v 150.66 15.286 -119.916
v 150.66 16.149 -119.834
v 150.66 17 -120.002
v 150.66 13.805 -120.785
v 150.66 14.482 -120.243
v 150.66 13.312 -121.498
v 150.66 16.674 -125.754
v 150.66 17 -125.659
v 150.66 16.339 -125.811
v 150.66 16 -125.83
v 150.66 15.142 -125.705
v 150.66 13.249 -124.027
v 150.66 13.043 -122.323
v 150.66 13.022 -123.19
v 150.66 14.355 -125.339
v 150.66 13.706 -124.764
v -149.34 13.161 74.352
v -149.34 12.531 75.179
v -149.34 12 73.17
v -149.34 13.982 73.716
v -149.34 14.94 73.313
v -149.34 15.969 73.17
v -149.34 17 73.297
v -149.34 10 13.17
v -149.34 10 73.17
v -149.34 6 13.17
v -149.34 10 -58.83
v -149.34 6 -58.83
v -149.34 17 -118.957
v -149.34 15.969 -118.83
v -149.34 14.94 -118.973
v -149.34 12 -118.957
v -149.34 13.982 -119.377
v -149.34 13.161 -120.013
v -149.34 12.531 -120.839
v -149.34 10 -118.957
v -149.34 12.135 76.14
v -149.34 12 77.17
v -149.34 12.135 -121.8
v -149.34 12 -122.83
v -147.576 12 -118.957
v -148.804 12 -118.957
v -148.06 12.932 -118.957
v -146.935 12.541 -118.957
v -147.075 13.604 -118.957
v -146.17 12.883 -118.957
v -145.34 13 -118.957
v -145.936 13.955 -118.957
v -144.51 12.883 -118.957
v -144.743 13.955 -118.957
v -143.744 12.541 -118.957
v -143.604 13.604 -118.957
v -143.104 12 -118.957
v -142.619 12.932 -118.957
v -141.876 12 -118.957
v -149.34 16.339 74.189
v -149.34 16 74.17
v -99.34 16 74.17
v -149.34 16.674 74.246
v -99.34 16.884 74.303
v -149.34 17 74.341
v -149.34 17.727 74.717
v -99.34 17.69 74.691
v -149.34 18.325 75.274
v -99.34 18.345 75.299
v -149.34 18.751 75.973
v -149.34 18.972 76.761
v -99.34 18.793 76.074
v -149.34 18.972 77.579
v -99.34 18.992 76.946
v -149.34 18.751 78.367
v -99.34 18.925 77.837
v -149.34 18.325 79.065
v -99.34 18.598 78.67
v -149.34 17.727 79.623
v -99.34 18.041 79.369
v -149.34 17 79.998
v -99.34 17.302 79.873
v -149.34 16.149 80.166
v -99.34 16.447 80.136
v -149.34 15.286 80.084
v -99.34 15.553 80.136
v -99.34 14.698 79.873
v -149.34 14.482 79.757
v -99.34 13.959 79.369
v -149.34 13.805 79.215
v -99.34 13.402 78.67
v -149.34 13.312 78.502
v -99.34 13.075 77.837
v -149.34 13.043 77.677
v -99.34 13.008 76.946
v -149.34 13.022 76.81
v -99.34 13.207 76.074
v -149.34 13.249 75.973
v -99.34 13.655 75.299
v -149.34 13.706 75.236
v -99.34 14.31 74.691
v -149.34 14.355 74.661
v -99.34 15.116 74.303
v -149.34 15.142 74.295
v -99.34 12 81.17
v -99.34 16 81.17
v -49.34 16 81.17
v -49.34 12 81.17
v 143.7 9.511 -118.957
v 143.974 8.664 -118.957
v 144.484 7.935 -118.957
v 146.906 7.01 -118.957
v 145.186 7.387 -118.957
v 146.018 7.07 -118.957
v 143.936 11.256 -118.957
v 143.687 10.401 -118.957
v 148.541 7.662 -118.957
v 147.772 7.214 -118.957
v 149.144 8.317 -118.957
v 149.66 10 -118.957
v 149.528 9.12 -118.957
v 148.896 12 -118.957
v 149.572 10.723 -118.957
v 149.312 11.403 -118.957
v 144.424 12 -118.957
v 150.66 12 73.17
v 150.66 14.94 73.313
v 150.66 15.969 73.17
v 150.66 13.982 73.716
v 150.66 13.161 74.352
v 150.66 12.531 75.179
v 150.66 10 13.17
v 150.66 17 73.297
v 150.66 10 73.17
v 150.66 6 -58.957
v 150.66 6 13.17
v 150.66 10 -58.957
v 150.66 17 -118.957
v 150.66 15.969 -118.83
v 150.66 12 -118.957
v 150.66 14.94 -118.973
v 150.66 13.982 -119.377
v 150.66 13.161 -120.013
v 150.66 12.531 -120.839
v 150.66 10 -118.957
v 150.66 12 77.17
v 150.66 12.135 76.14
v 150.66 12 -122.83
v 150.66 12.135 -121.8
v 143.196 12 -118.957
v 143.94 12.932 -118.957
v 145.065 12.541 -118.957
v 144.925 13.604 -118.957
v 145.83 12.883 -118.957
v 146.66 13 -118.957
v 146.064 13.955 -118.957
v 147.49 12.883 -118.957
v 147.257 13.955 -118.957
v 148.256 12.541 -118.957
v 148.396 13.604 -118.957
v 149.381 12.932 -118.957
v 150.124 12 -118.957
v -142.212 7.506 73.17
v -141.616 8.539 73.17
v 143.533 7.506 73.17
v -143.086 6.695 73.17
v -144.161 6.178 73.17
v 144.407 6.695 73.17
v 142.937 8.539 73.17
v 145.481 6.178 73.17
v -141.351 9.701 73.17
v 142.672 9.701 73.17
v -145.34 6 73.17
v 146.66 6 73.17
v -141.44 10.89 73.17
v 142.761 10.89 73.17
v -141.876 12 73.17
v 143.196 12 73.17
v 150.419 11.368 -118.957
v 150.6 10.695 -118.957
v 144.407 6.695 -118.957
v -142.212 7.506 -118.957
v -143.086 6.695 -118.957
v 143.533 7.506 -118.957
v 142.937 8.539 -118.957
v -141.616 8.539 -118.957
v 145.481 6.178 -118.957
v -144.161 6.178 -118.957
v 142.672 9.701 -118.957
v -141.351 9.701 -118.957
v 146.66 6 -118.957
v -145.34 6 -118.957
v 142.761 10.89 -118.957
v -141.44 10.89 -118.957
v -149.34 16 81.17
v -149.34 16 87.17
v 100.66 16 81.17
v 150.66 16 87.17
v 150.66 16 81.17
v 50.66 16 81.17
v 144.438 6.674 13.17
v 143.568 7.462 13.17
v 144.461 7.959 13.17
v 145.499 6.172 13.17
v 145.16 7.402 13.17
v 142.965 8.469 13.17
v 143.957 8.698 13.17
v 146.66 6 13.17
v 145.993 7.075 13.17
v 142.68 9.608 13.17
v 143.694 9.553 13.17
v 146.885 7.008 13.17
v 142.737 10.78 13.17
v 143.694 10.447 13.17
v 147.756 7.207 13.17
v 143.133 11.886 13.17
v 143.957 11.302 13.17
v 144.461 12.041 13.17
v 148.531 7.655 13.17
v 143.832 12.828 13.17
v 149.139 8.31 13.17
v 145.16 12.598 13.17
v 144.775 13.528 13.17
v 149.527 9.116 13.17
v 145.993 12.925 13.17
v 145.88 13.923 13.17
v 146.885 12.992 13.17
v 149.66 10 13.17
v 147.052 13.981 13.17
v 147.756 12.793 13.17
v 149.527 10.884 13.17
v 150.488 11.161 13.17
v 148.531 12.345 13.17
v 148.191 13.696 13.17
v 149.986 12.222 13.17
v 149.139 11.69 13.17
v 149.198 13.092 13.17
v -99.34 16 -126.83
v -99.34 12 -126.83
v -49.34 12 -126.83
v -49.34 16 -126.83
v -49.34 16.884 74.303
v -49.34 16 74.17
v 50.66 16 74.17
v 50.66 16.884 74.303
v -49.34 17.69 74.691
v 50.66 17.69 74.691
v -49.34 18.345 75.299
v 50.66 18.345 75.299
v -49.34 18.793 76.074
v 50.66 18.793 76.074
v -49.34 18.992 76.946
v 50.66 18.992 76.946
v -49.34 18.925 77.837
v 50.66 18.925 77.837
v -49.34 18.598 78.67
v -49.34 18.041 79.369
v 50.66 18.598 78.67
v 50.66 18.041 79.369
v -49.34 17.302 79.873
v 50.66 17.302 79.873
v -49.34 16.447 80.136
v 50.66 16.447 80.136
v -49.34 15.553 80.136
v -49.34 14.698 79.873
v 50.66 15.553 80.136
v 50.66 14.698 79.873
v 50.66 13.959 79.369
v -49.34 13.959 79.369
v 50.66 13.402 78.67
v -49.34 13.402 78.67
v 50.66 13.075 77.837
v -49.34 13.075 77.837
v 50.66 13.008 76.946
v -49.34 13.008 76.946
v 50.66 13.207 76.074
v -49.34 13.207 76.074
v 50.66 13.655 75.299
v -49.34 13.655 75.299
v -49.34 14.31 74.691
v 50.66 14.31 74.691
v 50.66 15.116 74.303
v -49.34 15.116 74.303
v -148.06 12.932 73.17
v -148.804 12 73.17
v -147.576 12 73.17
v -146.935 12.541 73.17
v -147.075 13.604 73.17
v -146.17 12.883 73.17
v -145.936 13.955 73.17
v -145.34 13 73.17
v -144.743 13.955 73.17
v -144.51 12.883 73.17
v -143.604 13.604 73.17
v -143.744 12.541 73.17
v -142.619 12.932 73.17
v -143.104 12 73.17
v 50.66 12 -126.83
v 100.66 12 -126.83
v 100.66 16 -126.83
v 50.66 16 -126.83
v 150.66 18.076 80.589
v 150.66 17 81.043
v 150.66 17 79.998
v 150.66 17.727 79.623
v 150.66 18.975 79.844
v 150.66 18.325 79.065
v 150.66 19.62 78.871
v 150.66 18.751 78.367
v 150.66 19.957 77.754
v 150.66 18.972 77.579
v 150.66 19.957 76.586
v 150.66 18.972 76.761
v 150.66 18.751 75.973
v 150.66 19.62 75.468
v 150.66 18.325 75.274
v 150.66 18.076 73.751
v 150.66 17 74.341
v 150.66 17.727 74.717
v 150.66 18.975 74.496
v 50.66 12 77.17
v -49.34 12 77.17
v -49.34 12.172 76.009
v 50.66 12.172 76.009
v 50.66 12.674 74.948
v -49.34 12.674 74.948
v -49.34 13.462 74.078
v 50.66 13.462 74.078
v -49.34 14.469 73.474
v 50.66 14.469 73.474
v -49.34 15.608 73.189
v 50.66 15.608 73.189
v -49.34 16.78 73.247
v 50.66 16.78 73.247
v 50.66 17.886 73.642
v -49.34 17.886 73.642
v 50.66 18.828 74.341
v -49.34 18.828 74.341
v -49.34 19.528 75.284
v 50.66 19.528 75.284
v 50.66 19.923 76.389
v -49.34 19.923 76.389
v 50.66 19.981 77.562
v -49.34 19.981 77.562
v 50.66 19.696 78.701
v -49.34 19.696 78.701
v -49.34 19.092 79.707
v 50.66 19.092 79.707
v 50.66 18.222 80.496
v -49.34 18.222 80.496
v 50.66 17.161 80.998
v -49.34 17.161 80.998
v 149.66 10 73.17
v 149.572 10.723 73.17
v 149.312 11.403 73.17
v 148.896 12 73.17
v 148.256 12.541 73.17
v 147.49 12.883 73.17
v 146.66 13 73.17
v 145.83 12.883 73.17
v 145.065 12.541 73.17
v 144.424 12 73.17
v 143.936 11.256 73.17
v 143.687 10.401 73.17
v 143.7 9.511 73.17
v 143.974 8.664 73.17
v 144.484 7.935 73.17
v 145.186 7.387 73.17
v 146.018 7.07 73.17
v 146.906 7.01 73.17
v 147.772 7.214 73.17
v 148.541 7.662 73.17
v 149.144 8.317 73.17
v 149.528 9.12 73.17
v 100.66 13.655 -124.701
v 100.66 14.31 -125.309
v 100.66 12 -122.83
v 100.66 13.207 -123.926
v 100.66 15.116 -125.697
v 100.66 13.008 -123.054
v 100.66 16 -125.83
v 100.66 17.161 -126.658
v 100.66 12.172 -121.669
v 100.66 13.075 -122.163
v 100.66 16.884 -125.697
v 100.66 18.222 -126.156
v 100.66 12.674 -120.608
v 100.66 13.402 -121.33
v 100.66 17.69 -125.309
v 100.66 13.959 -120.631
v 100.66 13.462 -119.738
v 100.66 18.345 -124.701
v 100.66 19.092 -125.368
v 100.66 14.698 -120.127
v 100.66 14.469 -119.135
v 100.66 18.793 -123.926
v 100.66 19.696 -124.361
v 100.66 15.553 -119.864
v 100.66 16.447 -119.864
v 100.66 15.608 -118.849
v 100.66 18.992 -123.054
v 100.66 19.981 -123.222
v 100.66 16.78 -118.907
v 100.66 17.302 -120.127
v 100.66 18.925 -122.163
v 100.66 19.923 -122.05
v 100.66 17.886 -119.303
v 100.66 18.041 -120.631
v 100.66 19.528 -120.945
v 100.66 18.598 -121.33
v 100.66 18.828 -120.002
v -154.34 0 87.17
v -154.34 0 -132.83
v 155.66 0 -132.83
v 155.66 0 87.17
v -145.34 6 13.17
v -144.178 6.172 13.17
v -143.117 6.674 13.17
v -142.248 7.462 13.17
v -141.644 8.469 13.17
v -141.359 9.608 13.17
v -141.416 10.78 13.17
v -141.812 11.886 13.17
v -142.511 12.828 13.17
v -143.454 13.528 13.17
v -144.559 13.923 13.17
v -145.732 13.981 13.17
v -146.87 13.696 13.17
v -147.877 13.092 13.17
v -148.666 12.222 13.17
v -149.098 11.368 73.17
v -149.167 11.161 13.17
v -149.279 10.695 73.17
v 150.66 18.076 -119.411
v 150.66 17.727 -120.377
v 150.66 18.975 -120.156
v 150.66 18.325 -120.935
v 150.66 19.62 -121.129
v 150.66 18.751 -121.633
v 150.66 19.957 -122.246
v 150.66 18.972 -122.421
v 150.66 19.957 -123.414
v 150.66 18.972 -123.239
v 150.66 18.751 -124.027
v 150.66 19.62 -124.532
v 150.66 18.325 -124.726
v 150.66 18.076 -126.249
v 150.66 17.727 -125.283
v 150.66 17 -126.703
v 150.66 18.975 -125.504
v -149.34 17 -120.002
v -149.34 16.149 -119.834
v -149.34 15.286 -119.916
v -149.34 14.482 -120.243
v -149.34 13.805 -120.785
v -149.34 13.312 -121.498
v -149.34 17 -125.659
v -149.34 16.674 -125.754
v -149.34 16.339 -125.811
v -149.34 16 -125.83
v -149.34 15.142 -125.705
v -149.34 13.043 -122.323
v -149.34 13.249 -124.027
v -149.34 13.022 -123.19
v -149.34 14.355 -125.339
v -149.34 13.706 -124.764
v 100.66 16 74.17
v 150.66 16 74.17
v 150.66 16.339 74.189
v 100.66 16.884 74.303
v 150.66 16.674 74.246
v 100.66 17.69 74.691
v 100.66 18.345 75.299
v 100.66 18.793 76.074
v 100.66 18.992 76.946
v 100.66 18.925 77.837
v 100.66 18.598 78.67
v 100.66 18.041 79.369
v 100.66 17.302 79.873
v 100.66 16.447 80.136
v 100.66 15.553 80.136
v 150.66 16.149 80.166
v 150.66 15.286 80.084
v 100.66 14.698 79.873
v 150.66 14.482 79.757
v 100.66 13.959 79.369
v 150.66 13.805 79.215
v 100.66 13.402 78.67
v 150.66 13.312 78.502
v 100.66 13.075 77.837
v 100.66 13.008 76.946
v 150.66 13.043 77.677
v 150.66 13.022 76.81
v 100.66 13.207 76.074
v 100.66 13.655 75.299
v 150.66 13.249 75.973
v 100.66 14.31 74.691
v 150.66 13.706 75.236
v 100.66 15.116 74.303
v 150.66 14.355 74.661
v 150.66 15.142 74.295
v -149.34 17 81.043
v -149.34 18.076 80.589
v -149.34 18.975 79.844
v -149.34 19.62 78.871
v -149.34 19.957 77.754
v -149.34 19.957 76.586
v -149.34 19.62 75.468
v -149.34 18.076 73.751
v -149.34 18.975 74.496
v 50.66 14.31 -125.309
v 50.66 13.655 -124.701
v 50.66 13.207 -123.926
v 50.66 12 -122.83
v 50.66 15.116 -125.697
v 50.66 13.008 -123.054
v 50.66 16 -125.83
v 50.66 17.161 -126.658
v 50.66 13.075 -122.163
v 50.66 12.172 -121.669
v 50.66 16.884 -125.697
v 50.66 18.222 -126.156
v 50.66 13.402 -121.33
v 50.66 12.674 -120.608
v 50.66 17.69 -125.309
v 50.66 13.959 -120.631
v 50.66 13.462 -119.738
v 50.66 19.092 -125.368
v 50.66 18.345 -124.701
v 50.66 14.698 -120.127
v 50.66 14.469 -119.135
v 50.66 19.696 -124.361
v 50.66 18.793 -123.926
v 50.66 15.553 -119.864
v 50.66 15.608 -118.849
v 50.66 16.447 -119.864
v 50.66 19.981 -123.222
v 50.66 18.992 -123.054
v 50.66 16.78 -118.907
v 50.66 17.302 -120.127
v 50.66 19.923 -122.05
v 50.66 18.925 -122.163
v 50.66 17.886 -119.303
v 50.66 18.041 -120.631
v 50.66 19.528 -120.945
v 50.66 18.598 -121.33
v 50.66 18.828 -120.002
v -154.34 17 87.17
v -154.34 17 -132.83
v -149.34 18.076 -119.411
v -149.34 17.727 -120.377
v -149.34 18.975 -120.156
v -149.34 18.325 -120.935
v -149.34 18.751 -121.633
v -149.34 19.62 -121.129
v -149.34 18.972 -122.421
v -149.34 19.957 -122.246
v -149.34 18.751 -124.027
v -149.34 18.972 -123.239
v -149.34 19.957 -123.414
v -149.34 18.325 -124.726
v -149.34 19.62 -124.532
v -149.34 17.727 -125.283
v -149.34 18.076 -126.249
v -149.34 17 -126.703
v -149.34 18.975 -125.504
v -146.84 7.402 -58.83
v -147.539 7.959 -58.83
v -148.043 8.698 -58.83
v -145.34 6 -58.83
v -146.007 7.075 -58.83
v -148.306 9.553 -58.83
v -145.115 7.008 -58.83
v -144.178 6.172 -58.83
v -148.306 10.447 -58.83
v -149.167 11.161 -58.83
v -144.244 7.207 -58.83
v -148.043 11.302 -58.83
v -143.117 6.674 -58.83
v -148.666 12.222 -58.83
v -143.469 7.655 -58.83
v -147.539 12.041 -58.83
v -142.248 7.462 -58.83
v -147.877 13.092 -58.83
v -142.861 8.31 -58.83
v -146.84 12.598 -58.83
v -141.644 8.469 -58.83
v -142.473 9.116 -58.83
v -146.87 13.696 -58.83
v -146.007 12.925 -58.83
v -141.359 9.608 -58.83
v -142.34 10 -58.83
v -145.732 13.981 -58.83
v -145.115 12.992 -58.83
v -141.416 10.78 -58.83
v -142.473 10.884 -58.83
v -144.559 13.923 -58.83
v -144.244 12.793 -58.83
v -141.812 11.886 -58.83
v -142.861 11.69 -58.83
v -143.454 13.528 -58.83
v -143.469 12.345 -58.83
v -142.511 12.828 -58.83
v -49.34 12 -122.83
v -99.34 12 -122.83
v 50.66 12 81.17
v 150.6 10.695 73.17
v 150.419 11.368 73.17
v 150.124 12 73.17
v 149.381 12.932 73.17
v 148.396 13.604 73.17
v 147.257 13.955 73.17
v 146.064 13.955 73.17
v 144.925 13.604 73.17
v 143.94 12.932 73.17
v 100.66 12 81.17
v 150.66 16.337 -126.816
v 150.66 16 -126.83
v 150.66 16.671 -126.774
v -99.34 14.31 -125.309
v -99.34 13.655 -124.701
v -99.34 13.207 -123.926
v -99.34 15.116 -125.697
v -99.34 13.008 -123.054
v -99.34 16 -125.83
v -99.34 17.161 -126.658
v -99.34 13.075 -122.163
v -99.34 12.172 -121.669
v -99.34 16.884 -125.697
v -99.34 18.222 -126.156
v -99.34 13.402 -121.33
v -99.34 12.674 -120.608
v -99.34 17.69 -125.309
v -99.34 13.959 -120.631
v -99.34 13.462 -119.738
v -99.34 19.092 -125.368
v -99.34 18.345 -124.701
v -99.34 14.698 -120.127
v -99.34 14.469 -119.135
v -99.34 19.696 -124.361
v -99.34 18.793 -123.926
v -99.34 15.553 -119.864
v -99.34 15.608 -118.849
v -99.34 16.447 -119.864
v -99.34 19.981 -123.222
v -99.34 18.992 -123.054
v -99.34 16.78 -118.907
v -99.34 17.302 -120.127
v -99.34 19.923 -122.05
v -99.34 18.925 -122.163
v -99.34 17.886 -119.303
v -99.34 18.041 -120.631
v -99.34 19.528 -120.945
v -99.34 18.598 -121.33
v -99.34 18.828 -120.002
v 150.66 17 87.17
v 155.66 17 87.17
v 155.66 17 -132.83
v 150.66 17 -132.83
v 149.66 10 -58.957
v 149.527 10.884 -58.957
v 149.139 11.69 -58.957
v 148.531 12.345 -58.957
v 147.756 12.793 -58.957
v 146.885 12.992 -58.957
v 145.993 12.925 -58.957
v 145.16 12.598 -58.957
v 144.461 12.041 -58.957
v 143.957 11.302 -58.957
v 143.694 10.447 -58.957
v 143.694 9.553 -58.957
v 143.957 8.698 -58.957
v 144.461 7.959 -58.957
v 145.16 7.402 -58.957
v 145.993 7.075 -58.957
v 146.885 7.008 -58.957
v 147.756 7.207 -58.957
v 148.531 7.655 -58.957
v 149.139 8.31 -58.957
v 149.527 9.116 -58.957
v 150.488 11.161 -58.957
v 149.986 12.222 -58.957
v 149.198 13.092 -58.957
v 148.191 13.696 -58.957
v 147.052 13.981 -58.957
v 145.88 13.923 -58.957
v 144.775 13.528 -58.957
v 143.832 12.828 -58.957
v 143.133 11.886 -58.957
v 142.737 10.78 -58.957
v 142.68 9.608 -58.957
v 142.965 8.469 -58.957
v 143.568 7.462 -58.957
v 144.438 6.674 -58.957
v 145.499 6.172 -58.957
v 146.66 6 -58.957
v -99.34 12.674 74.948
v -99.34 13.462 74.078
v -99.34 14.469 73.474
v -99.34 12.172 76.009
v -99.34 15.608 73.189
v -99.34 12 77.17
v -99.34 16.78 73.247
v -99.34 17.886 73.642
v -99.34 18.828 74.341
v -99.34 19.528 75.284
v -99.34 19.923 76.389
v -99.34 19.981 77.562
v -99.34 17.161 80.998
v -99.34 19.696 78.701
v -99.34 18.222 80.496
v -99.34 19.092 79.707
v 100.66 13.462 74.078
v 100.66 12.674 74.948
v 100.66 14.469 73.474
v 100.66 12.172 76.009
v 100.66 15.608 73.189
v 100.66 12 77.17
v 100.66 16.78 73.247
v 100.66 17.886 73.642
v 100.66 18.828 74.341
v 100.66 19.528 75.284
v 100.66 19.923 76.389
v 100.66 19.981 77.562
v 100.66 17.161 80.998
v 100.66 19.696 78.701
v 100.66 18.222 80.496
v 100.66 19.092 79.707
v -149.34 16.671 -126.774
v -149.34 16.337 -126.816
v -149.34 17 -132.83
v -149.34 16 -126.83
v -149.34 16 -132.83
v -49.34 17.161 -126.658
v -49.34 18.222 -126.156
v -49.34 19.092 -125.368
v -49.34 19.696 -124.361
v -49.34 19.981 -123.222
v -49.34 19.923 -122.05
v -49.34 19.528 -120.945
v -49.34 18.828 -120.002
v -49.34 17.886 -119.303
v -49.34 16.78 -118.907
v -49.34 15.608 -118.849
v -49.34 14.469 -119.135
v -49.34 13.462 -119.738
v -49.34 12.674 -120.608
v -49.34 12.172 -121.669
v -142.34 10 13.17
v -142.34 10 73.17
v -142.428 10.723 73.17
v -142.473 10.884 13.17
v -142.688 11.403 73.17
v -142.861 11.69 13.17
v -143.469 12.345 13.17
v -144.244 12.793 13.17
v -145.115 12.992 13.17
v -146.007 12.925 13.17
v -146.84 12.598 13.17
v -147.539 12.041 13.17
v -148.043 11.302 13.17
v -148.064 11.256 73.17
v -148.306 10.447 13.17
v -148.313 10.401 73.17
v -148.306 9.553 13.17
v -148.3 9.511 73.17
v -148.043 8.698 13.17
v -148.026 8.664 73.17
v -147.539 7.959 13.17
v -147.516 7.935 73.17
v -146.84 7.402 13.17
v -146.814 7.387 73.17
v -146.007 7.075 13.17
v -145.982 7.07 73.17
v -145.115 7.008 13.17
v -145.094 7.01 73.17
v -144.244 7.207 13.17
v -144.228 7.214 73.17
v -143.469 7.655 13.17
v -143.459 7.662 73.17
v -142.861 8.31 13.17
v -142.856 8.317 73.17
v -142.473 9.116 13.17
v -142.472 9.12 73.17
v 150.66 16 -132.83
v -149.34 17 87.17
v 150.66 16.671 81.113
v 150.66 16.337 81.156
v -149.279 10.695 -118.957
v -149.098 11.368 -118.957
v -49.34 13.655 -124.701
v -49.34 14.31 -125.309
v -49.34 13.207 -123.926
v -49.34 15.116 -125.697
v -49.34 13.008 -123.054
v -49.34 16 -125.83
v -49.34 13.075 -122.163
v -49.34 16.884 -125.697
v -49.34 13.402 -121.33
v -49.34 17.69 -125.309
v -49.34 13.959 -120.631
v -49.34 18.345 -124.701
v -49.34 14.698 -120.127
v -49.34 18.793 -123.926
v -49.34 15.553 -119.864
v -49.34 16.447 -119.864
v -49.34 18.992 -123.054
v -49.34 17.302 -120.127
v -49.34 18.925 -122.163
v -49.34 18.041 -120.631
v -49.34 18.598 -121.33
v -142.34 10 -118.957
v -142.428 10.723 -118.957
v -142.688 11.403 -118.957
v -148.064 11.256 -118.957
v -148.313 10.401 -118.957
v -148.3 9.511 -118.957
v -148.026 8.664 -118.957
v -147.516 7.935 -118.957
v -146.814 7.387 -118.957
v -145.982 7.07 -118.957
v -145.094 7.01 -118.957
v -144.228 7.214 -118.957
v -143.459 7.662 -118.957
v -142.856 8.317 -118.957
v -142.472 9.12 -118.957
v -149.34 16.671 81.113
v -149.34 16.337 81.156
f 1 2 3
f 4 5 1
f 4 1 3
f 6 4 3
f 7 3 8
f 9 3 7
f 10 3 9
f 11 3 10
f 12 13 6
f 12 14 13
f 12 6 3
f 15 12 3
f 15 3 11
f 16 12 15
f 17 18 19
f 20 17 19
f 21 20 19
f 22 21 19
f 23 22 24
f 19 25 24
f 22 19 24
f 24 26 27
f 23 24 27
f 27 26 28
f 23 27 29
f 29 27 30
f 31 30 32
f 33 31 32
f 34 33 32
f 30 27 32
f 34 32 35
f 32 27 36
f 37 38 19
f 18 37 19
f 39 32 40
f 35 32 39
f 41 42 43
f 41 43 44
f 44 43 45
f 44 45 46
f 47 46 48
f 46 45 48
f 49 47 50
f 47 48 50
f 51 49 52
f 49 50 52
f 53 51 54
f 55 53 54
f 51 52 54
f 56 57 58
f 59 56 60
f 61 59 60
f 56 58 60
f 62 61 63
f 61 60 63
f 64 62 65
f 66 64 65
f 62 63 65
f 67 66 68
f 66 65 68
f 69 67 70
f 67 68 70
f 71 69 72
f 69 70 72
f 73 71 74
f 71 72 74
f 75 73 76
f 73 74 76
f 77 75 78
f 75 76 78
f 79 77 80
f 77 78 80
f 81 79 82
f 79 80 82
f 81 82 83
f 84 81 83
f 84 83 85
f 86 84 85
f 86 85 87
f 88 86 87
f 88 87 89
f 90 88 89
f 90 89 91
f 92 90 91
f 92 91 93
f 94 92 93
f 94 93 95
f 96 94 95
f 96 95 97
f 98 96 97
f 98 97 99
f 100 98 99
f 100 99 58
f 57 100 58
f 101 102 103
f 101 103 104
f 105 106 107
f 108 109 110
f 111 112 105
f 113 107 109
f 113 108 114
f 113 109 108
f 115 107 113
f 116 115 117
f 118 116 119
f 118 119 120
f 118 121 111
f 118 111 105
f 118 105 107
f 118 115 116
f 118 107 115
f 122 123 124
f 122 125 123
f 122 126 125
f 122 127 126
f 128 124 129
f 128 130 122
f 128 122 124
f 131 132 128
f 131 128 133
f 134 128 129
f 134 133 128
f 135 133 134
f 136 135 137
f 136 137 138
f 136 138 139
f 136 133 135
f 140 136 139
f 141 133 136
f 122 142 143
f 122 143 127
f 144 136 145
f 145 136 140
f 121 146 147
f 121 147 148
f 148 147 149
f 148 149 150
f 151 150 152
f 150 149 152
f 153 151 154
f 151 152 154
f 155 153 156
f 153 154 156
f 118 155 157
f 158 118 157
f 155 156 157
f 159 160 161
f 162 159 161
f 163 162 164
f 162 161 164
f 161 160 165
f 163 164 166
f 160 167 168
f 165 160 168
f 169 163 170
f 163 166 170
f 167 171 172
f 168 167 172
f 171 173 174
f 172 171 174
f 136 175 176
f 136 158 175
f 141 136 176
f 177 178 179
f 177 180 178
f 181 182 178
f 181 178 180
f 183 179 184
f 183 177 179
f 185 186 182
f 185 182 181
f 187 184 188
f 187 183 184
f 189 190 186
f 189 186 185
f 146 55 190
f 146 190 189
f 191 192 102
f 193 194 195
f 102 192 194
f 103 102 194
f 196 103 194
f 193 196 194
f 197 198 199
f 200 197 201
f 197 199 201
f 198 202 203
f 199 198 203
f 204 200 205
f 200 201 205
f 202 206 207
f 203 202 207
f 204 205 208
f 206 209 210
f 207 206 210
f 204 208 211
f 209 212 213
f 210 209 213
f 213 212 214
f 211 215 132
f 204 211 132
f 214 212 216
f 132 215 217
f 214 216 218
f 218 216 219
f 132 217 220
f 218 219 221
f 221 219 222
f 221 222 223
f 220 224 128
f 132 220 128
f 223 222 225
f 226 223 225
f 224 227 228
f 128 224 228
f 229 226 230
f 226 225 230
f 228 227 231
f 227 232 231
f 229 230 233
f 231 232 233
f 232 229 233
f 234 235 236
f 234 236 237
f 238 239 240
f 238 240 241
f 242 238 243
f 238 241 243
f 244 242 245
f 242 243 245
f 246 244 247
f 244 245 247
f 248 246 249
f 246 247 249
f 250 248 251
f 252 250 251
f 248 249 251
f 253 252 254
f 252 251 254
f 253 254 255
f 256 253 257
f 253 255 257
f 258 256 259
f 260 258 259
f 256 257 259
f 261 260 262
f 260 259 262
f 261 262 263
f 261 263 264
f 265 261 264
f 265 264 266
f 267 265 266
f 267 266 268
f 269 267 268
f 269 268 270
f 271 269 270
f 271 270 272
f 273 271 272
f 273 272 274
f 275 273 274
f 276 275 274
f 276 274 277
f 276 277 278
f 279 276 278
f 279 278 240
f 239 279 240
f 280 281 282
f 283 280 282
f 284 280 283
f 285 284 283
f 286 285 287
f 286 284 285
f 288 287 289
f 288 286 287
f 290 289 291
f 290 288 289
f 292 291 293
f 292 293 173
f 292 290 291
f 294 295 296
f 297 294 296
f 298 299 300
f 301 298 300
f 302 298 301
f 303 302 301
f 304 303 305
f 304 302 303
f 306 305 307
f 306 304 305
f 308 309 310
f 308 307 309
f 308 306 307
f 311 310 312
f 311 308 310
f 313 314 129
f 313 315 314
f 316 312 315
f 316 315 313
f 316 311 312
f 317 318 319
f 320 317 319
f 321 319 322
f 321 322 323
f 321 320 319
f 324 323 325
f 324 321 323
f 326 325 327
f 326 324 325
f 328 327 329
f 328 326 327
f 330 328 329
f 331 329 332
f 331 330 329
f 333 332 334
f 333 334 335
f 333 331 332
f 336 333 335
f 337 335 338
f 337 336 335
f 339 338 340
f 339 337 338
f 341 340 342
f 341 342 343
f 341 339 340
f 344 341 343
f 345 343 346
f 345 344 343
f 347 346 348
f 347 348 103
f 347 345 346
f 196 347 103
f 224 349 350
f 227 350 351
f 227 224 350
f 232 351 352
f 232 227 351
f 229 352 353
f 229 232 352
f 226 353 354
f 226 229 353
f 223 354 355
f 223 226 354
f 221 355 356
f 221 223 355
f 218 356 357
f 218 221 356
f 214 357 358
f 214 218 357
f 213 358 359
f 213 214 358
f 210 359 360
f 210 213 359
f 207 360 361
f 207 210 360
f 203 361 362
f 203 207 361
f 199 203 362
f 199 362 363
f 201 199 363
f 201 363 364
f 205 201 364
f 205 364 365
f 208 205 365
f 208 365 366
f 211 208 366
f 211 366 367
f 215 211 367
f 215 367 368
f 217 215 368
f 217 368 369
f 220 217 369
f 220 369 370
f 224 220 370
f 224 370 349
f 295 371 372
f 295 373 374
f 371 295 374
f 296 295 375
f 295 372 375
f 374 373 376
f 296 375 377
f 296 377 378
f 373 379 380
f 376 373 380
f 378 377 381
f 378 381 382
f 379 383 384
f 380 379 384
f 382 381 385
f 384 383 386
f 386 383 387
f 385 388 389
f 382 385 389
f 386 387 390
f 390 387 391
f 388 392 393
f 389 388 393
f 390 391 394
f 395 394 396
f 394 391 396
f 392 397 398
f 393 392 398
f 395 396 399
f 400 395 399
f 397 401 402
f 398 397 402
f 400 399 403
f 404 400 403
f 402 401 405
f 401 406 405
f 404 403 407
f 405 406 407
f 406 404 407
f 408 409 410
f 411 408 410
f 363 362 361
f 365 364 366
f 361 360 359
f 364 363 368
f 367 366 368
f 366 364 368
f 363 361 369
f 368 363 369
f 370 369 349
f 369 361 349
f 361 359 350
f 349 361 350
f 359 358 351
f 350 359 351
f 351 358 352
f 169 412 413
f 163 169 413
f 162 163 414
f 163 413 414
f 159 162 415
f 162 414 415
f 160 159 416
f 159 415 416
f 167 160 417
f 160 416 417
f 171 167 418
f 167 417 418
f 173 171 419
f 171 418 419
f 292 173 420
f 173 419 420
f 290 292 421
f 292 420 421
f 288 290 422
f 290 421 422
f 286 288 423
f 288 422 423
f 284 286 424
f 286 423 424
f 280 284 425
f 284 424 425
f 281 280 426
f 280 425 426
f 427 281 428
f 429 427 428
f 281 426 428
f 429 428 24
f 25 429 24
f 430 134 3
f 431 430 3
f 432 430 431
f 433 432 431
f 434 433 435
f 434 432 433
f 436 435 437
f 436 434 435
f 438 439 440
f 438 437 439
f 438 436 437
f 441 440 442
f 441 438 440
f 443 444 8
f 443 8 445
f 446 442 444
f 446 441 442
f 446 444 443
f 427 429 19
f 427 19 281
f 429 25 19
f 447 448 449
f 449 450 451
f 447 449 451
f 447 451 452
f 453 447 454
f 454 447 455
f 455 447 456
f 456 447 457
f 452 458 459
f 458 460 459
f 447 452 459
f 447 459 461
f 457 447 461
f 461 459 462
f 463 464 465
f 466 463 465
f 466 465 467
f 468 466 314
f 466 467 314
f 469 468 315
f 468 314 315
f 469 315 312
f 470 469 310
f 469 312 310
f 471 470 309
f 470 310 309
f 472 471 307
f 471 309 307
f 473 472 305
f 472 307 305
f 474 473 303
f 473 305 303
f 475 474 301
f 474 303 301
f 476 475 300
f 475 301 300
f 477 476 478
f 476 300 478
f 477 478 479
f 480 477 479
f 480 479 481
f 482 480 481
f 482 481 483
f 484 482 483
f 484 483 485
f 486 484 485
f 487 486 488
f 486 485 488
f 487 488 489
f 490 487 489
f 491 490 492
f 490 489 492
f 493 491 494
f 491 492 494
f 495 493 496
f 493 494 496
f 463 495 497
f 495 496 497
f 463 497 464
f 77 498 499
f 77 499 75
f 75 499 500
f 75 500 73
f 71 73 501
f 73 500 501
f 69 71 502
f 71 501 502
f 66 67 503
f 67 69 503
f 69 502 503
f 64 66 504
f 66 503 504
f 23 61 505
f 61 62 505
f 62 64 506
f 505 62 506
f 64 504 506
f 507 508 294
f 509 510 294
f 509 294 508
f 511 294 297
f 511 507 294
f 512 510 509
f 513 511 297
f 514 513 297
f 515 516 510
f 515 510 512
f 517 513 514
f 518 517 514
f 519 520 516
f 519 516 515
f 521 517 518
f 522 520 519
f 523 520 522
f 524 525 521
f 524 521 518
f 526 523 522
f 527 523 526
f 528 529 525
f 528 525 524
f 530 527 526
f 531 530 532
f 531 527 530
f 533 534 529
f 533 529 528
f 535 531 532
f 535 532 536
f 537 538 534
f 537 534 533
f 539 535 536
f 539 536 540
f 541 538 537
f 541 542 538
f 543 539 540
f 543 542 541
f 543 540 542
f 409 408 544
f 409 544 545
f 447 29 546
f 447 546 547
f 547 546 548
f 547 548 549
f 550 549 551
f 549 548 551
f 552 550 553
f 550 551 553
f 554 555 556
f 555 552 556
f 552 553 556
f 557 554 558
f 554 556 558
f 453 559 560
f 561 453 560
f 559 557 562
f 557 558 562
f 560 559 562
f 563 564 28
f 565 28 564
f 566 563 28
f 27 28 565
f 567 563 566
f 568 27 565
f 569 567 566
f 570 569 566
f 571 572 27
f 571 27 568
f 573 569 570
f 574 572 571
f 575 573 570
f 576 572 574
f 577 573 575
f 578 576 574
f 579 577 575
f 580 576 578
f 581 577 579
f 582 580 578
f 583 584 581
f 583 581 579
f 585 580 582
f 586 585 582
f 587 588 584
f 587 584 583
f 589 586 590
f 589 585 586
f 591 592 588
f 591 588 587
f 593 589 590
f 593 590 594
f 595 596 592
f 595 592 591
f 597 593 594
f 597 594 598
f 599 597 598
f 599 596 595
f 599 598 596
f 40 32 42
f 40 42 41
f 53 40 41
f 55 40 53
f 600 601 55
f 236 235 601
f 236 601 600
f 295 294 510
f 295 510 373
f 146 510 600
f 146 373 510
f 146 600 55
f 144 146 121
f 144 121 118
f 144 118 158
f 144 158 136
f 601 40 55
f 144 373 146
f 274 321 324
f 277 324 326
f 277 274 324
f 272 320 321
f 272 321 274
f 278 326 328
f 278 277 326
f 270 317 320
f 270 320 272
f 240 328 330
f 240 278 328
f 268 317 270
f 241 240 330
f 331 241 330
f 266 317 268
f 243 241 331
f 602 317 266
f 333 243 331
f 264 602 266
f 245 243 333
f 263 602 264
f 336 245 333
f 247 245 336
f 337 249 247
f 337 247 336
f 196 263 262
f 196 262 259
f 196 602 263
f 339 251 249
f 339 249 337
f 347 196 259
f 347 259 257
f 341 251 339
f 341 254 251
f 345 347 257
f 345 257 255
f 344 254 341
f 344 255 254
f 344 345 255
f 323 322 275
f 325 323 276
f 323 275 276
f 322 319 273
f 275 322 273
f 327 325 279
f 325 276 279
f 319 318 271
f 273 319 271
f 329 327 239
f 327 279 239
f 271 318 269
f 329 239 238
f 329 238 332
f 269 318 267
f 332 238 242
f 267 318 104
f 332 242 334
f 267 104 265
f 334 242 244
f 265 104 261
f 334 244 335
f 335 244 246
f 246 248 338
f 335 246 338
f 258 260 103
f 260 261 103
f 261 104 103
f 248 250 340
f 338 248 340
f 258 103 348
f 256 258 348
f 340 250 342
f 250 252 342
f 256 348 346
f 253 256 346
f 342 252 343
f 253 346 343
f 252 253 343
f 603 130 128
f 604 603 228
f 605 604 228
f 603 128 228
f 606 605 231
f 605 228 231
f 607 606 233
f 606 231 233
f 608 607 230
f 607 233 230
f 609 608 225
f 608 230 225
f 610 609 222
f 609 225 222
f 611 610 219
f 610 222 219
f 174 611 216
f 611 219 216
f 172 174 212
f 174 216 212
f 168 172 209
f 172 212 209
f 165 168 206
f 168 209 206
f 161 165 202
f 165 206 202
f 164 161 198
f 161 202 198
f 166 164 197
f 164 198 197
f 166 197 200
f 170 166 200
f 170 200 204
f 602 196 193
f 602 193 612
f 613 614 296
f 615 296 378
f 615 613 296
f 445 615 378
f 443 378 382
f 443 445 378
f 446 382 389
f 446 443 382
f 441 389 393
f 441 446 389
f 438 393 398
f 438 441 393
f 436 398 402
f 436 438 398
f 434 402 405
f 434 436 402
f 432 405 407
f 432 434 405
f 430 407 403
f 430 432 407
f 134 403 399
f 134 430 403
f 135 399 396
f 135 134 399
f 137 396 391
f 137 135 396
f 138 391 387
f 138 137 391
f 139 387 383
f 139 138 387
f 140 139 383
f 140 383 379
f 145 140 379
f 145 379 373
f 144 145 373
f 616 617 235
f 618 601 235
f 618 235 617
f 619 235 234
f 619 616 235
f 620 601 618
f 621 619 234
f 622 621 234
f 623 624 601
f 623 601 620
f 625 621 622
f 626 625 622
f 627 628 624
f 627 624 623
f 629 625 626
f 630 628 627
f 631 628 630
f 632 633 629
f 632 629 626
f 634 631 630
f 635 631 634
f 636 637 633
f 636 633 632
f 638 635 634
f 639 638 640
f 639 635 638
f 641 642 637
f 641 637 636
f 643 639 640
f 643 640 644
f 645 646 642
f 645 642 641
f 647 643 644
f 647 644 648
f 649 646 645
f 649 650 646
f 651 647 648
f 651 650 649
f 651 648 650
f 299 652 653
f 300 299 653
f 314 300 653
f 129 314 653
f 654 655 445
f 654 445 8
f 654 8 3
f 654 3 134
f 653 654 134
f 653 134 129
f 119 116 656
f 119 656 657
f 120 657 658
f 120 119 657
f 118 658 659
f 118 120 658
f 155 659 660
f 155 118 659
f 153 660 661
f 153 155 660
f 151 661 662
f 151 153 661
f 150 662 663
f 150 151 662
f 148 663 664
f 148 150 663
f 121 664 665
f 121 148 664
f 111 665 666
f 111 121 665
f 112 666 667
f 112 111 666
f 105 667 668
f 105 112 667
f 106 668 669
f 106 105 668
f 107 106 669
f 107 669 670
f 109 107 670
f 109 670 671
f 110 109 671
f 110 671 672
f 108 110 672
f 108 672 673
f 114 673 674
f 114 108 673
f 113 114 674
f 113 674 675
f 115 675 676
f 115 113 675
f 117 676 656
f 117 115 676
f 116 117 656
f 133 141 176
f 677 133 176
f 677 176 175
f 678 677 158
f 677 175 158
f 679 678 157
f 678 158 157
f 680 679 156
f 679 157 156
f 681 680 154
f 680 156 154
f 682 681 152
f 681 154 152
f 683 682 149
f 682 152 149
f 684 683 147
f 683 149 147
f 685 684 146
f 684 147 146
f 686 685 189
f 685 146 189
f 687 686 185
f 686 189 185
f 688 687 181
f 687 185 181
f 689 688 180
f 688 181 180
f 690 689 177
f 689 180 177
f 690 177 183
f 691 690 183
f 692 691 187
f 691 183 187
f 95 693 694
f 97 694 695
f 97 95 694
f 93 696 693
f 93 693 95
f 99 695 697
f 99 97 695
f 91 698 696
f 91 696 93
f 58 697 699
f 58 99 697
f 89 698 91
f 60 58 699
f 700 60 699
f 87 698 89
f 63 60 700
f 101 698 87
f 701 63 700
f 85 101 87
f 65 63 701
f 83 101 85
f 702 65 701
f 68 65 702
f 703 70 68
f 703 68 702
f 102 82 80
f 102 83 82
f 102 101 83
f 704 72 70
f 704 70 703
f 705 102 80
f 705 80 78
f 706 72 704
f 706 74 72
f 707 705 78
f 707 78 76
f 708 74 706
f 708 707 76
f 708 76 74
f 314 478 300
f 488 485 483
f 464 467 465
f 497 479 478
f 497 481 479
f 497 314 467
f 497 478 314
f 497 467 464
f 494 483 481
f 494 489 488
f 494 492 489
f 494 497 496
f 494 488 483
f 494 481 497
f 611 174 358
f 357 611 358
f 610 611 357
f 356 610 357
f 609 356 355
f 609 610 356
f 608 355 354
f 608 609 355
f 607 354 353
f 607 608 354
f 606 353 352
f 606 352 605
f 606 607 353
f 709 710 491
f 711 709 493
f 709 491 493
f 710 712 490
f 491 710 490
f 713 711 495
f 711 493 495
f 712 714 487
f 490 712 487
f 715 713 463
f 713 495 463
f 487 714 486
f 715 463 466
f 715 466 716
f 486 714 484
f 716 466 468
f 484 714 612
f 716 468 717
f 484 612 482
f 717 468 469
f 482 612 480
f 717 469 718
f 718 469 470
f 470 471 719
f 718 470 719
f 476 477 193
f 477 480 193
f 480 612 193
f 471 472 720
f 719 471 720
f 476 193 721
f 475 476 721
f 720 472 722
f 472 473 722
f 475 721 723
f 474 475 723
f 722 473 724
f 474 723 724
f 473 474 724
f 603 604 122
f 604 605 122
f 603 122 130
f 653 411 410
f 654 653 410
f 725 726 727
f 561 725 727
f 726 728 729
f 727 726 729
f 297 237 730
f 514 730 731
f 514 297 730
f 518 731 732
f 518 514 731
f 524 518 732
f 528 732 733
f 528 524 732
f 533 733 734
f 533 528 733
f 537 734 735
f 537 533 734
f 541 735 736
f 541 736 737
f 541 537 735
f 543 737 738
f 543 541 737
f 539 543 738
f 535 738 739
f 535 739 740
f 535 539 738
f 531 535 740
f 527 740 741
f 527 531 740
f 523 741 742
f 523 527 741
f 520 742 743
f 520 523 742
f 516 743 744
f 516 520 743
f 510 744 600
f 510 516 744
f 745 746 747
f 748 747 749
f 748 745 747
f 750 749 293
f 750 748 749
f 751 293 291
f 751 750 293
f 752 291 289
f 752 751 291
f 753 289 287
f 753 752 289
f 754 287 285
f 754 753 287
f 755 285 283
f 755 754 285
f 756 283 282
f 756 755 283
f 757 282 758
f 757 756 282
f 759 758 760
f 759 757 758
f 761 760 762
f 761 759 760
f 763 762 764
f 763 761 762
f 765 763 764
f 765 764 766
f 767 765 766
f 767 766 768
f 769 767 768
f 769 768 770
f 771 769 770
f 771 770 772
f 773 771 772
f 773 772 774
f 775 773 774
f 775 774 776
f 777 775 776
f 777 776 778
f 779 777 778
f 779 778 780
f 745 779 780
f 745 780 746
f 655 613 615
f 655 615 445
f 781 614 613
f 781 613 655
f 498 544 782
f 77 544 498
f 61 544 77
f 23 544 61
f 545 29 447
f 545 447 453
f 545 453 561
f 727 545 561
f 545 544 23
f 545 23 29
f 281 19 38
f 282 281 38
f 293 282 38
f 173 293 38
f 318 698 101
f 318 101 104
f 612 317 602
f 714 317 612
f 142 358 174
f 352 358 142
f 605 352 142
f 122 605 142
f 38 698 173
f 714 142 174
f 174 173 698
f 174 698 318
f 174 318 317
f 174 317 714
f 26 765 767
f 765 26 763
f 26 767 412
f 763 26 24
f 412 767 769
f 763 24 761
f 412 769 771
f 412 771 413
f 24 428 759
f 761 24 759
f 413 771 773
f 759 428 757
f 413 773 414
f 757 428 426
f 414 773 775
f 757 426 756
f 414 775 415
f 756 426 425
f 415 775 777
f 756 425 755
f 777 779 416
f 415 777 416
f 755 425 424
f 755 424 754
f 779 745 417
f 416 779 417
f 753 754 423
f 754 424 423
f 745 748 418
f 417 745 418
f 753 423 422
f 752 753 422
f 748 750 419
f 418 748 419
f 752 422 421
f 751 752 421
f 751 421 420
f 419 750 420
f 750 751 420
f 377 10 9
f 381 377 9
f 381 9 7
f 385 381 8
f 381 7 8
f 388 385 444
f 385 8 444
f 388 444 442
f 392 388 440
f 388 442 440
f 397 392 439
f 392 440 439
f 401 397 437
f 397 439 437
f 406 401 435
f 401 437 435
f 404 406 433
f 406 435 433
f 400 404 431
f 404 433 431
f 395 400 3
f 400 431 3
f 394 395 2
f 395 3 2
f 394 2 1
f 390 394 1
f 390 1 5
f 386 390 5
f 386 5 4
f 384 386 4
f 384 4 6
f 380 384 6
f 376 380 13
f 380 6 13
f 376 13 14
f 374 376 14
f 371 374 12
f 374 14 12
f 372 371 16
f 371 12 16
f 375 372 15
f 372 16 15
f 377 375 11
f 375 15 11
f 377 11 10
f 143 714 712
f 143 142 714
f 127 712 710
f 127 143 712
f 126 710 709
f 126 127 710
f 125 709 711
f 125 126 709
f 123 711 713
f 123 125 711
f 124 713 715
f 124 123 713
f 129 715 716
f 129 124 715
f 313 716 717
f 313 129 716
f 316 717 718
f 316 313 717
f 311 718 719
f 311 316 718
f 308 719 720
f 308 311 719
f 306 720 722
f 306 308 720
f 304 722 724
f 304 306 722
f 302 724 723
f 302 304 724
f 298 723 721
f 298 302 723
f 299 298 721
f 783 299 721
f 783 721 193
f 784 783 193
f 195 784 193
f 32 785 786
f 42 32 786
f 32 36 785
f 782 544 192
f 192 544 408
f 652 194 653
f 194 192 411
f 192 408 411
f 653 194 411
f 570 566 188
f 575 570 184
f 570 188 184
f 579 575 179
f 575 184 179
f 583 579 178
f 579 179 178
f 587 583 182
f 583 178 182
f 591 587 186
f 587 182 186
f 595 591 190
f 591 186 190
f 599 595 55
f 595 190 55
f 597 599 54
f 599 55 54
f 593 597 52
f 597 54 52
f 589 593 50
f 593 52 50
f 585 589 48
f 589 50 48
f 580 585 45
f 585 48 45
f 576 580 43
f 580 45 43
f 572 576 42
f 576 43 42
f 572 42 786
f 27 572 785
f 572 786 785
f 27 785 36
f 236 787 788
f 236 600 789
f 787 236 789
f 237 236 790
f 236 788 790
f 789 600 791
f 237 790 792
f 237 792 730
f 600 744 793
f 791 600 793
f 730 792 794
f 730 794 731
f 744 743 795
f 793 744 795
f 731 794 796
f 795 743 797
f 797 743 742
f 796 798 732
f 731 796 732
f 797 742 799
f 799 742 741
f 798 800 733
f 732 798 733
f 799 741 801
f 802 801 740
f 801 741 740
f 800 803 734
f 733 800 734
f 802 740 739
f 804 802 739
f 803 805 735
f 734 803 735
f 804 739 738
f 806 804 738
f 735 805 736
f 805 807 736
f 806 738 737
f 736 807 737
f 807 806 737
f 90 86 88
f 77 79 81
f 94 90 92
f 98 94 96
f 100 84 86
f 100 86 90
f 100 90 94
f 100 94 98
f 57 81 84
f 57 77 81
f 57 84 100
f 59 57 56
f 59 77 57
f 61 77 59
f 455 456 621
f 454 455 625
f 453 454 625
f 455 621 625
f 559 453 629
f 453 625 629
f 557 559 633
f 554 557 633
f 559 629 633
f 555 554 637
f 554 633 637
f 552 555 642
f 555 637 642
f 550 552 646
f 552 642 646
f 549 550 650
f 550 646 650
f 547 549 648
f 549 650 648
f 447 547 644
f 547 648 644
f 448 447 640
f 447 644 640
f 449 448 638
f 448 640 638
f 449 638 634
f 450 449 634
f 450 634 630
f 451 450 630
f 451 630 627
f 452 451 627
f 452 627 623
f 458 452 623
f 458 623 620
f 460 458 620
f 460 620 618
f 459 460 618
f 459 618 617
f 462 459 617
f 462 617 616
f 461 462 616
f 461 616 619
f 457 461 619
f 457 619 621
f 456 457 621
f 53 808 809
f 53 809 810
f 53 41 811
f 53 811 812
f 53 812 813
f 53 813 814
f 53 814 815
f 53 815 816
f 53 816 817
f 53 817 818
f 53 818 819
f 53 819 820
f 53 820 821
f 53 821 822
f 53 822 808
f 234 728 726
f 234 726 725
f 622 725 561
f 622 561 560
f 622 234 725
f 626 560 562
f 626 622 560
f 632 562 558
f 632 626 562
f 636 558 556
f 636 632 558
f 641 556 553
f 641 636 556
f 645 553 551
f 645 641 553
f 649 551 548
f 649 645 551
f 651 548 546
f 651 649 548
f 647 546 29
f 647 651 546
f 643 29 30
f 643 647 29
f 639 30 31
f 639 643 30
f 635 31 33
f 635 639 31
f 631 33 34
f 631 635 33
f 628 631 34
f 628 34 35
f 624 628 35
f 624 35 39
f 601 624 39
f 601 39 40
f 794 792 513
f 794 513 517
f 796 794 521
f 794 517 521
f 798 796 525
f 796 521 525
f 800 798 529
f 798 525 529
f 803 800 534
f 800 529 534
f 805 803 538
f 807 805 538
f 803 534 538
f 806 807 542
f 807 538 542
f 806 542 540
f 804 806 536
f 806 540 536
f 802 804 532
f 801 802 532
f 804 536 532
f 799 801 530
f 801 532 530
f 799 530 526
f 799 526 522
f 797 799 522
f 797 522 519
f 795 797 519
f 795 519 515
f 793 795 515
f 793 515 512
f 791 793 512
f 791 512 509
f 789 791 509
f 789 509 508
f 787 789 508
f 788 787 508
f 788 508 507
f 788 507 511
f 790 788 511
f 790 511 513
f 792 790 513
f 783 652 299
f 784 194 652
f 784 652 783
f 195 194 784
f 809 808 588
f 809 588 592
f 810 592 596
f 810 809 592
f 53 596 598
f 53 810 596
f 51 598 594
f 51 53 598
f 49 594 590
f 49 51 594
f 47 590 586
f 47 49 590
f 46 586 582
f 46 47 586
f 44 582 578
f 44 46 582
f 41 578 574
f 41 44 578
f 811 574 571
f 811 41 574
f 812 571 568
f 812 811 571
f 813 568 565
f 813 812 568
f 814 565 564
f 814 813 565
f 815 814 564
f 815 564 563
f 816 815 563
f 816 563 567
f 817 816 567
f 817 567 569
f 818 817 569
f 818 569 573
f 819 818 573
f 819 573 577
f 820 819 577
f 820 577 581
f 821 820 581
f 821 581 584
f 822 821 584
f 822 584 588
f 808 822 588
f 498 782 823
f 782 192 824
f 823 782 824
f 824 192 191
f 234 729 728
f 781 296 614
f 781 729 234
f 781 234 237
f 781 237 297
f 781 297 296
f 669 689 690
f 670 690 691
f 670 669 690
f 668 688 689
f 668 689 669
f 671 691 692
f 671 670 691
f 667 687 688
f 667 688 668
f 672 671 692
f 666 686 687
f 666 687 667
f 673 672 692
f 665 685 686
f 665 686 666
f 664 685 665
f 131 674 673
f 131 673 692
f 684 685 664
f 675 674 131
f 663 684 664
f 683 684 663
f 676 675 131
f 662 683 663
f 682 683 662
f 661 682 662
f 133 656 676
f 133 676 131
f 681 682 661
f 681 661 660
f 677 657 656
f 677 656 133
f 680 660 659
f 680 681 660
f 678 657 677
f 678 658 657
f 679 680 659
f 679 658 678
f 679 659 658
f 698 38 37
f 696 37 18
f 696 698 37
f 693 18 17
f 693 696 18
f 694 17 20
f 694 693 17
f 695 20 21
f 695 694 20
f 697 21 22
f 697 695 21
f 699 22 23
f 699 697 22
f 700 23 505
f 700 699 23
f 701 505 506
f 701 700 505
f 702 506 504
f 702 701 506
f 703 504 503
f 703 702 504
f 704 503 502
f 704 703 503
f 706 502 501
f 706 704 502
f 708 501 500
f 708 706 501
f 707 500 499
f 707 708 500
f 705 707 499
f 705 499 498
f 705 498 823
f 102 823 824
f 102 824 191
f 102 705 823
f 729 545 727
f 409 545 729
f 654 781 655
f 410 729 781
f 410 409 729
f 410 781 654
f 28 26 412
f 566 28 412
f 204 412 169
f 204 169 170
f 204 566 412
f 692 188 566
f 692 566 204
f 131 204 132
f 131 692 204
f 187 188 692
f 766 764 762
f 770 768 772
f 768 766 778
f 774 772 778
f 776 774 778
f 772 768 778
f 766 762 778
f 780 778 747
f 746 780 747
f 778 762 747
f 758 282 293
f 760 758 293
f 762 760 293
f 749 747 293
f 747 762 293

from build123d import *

# Parameters (mm, degrees)
SKETCH_1_W                 = 310
SKETCH_1_H                 = 220
EXTRUDE_1_DEPTH            = 12
SKETCH_8_W                 = 310
SKETCH_8_H                 = 10
EXTRUDE_12_DEPTH           = 4
SKETCH_10_R                = 4
CUT_EXTRUDE_5_DEPTH        = 305
SKETCH_11_W                = 4
SKETCH_11_H                = 4
EXTRUDE_13_DEPTH           = 5
EXTRUDE_START              = 300
SKETCH_12_R                = 4
SKETCH_12_R_2              = 3
EXTRUDE_1_2_DEPTH          = 300
SKETCH_15_W                = 5
SKETCH_15_H                = 220
EXTRUDE_15_DEPTH           = 5
SPLIT_START                = -99.339622642
SPLIT_BODIES_1_OUTLINE_R   = 3
SPLIT_BODIES_1_DEPTH       = 50
SPLIT_START_2              = 50.660377358
SPLIT_BODIES_1_2_OUTLINE_R = 3
SPLIT_BODIES_1_2_DEPTH     = 50
SKETCH_16_W                = 50
SKETCH_16_H                = 8
EXTRUDE_16_DEPTH           = 12
SKETCH_19_W                = 300
SKETCH_19_H                = 192.127016654
CUT_EXTRUDE_6_DEPTH        = 6
SKETCH_22_W                = 4
SKETCH_22_H                = 192.127016654
EXTRUDE_17_DEPTH           = 4
SKETCH_23_R                = 4
CUT_EXTRUDE_8_DEPTH        = 192.127016654
SKETCH_23_3_R              = 4
SKETCH_23_3_R_2            = 3
EXTRUDE_2_DEPTH            = 192.127016654
SPLIT_START_3              = -58.830188679
SPLIT_BODIES_2_OUTLINE_R   = 3
SPLIT_BODIES_2_DEPTH       = 72
SPLIT_START_4              = -58.957205333
SPLIT_BODIES_2_2_OUTLINE_R = 3
SPLIT_BODIES_2_2_DEPTH     = 0.127016654
SKETCH_24_W                = 8
SKETCH_24_H                = 72
SKETCH_24_H_2              = 72.127016654
EXTRUDE_18_DEPTH           = 6


# Read off the part's stored shape, not the designer's step: 分割1, 分割2
with BuildPart() as part:
    # 草图1 → Extrude 1 (new body)
    with BuildSketch(Plane(origin=(0, 0, 0), x_dir=(1, 0, 0), z_dir=(0, 1, 0))):
        with Locations((0.660377358, 22.830188679)):
            Rectangle(SKETCH_1_W, SKETCH_1_H)
    extrude(amount=EXTRUDE_1_DEPTH)

    # 草图8 → 凸台-拉伸12 (add)
    with BuildSketch(Plane(origin=(0, 12, 0), x_dir=(1, 0, 0), z_dir=(0, 1, 0))):
        with Locations((0.660377358, 127.830188679)):
            Rectangle(SKETCH_8_W, SKETCH_8_H)
        with Locations((0.660377358, -82.169811321)):
            Rectangle(SKETCH_8_W, SKETCH_8_H)
    extrude(amount=EXTRUDE_12_DEPTH)

    # 草图10 → 切除-拉伸5 (cut)
    with BuildSketch(Plane(origin=(155.660377358, 0, 0), x_dir=(0, 0, -1), z_dir=(1, 0, 0))):
        with Locations((-77.169811321, 16)):
            Circle(SKETCH_10_R)
        with Locations((122.830188679, 16)):
            Circle(SKETCH_10_R)
    extrude(amount=-CUT_EXTRUDE_5_DEPTH, mode=Mode.SUBTRACT)

    # 草图11 → 凸台-拉伸13 (add)
    with BuildSketch(Plane(origin=(155.660377358, 0, 0), x_dir=(0, 0, -1), z_dir=(1, 0, 0))):
        with Locations((-79.169811321, 14)):
            Rectangle(SKETCH_11_W, SKETCH_11_H)
        with Locations((124.830188679, 14)):
            Rectangle(SKETCH_11_W, SKETCH_11_H)
    extrude(amount=-EXTRUDE_13_DEPTH)

    # 草图12 → Extrude 1 2 (add)
    # profile 1 of 2: a face of its own
    with BuildSketch(Plane(origin=(-149.339622642, 0, 0), x_dir=(0, 0, -1), z_dir=(1, 0, 0)).offset(EXTRUDE_START)):
        with Locations((-77.169811321, 16)):
            Circle(SKETCH_12_R)
        with Locations((-77.169811321, 16)):
            Circle(SKETCH_12_R_2, mode=Mode.SUBTRACT)
    # profile 2 of 2: a face of its own
    with BuildSketch(Plane(origin=(-149.339622642, 0, 0), x_dir=(0, 0, -1), z_dir=(1, 0, 0)).offset(EXTRUDE_START)):
        with Locations((122.830188679, 16)):
            Circle(SKETCH_12_R)
        with Locations((122.830188679, 16)):
            Circle(SKETCH_12_R_2, mode=Mode.SUBTRACT)
    extrude(amount=-EXTRUDE_1_2_DEPTH)

    # 草图15 → 凸台-拉伸15 (add)
    with BuildSketch(Plane(origin=(0, 12, 0), x_dir=(1, 0, 0), z_dir=(0, 1, 0))):
        with Locations((-151.839622642, 22.830188679)):
            Rectangle(SKETCH_15_W, SKETCH_15_H)
        with Locations((153.160377358, 22.830188679)):
            Rectangle(SKETCH_15_W, SKETCH_15_H)
    extrude(amount=EXTRUDE_15_DEPTH)

    # Split Bodies 1 outline → Split Bodies 1 (cut)
    # profile 1 of 2: a face of its own
    with BuildSketch(Plane.YZ.offset(SPLIT_START)):
        with BuildLine():
            ThreePointArc((12, 77.169811321), (18.828427125, 74.341384196), (16, 81.169811321))
            Line((16, 81.169811321), (0, 81.169811321))
            Line((0, 81.169811321), (0, 73.169811321))
            Line((0, 73.169811321), (12, 73.169811321))
            Line((12, 73.169811321), (12, 77.169811321))
        make_face()
        with Locations((16, 77.169811321)):
            Circle(SPLIT_BODIES_1_OUTLINE_R, mode=Mode.SUBTRACT)
    # profile 2 of 2: a face of its own
    with BuildSketch(Plane.YZ.offset(SPLIT_START)):
        with BuildLine():
            Line((12, -118.830188679), (0, -118.830188679))
            Line((0, -118.830188679), (0, -126.830188679))
            Line((0, -126.830188679), (16, -126.830188679))
            ThreePointArc((16, -126.830188679), (18.828427125, -120.001761554), (12, -122.830188679))
            Line((12, -122.830188679), (12, -118.830188679))
        make_face()
        with Locations((16, -122.830188679)):
            Circle(SPLIT_BODIES_1_OUTLINE_R, mode=Mode.SUBTRACT)
    extrude(amount=SPLIT_BODIES_1_DEPTH, mode=Mode.SUBTRACT)

    # Split Bodies 1 2 outline → Split Bodies 1 2 (cut)
    # profile 1 of 2: a face of its own
    with BuildSketch(Plane.YZ.offset(SPLIT_START_2)):
        with BuildLine():
            ThreePointArc((12, 77.169811321), (18.828427125, 74.341384196), (16, 81.169811321))
            Line((16, 81.169811321), (0, 81.169811321))
            Line((0, 81.169811321), (0, 73.169811321))
            Line((0, 73.169811321), (12, 73.169811321))
            Line((12, 73.169811321), (12, 77.169811321))
        make_face()
        with Locations((16, 77.169811321)):
            Circle(SPLIT_BODIES_1_2_OUTLINE_R, mode=Mode.SUBTRACT)
    # profile 2 of 2: a face of its own
    with BuildSketch(Plane.YZ.offset(SPLIT_START_2)):
        with BuildLine():
            Line((12, -118.830188679), (0, -118.830188679))
            Line((0, -118.830188679), (0, -126.830188679))
            Line((0, -126.830188679), (16, -126.830188679))
            ThreePointArc((16, -126.830188679), (18.828427125, -120.001761554), (12, -122.830188679))
            Line((12, -122.830188679), (12, -118.830188679))
        make_face()
        with Locations((16, -122.830188679)):
            Circle(SPLIT_BODIES_1_2_OUTLINE_R, mode=Mode.SUBTRACT)
    extrude(amount=SPLIT_BODIES_1_2_DEPTH, mode=Mode.SUBTRACT)

    # 草图16 → 凸台-拉伸16 (add)
    with BuildSketch(Plane(origin=(0, 12, 0), x_dir=(1, 0, 0), z_dir=(0, 1, 0))):
        with Locations((-74.339622642, 122.830188679)):
            Rectangle(SKETCH_16_W, SKETCH_16_H)
        with Locations((75.660377358, 122.830188679)):
            Rectangle(SKETCH_16_W, SKETCH_16_H)
        with Locations((-74.339622642, -77.169811321)):
            Rectangle(SKETCH_16_W, SKETCH_16_H)
        with Locations((75.660377358, -77.169811321)):
            Rectangle(SKETCH_16_W, SKETCH_16_H)
    extrude(amount=-EXTRUDE_16_DEPTH)

    # 草图19 → 切除-拉伸6 (cut)
    with BuildSketch(Plane(origin=(0, 12, 0), x_dir=(1, 0, 0), z_dir=(0, 1, 0))):
        with Locations((0.660377358, 22.893697006)):
            Rectangle(SKETCH_19_W, SKETCH_19_H)
    extrude(amount=-CUT_EXTRUDE_6_DEPTH, mode=Mode.SUBTRACT)

    # 草图22 → 凸台-拉伸17 (add)
    with BuildSketch(Plane(origin=(0, 6, 0), x_dir=(1, 0, 0), z_dir=(0, 1, 0))):
        with Locations((-147.339622642, 22.893697006)):
            Rectangle(SKETCH_22_W, SKETCH_22_H)
        with Locations((148.660377358, 22.893697006)):
            Rectangle(SKETCH_22_W, SKETCH_22_H)
    extrude(amount=EXTRUDE_17_DEPTH)

    # 草图23 → 切除-拉伸8 (cut)
    with BuildSketch(Plane.XY.offset(-118.957205333)):
        with Locations((-145.339622642, 10)):
            Circle(SKETCH_23_R)
        with Locations((146.660377358, 10)):
            Circle(SKETCH_23_R)
    extrude(amount=CUT_EXTRUDE_8_DEPTH, mode=Mode.SUBTRACT)

    # 草图23<3> → 拉伸-薄壁2 (add)
    # profile 1 of 2: a face of its own
    with BuildSketch(Plane.XY.offset(-118.957205333)):
        with Locations((-145.339622642, 10)):
            Circle(SKETCH_23_3_R)
        with Locations((-145.339622642, 10)):
            Circle(SKETCH_23_3_R_2, mode=Mode.SUBTRACT)
    # profile 2 of 2: a face of its own
    with BuildSketch(Plane.XY.offset(-118.957205333)):
        with Locations((146.660377358, 10)):
            Circle(SKETCH_23_3_R)
        with Locations((146.660377358, 10)):
            Circle(SKETCH_23_3_R_2, mode=Mode.SUBTRACT)
    extrude(amount=EXTRUDE_2_DEPTH)

    # Split Bodies 2 outline → Split Bodies 2 (cut)
    # profile 1 of 2: a face of its own
    with BuildSketch(Plane.XY.offset(SPLIT_START_3)):
        with BuildLine():
            Line((-149.339622642, 0), (-141.339622642, 0))
            Line((-141.339622642, 0), (-141.339622642, 6))
            Line((-141.339622642, 6), (-145.339622642, 6))
            ThreePointArc((-145.339622642, 6), (-142.511195517, 12.828427125), (-149.339622642, 10))
            Line((-149.339622642, 10), (-149.339622642, 0))
        make_face()
        with Locations((-145.339622642, 10)):
            Circle(SPLIT_BODIES_2_OUTLINE_R, mode=Mode.SUBTRACT)
    # profile 2 of 2: a face of its own
    with BuildSketch(Plane.XY.offset(SPLIT_START_3)):
        with BuildLine():
            Line((142.660377358, 6), (142.660377358, 0))
            Line((142.660377358, 0), (150.660377358, 0))
            Line((150.660377358, 0), (150.660377358, 10))
            ThreePointArc((150.660377358, 10), (143.831950234, 12.828427125), (146.660377358, 6))
            Line((146.660377358, 6), (142.660377358, 6))
        make_face()
        with Locations((146.660377358, 10)):
            Circle(SPLIT_BODIES_2_OUTLINE_R, mode=Mode.SUBTRACT)
    extrude(amount=SPLIT_BODIES_2_DEPTH, mode=Mode.SUBTRACT)

    # Split Bodies 2 2 outline → Split Bodies 2 2 (cut)
    with BuildSketch(Plane.XY.offset(SPLIT_START_4)):
        with BuildLine():
            Line((142.660377358, 6), (142.660377358, 0))
            Line((142.660377358, 0), (150.660377358, 0))
            Line((150.660377358, 0), (150.660377358, 10))
            ThreePointArc((150.660377358, 10), (143.831950234, 12.828427125), (146.660377358, 6))
            Line((146.660377358, 6), (142.660377358, 6))
        make_face()
        with Locations((146.660377358, 10)):
            Circle(SPLIT_BODIES_2_2_OUTLINE_R, mode=Mode.SUBTRACT)
    extrude(amount=SPLIT_BODIES_2_2_DEPTH, mode=Mode.SUBTRACT)

    # 草图24 → 凸台-拉伸18 (add)
    with BuildSketch(Plane(origin=(0, 6, 0), x_dir=(1, 0, 0), z_dir=(0, 1, 0))):
        with Locations((-145.339622642, 22.830188679)):
            Rectangle(SKETCH_24_W, SKETCH_24_H)
        with Locations((146.660377358, 22.893697006)):
            Rectangle(SKETCH_24_W, SKETCH_24_H_2)
    extrude(amount=-EXTRUDE_18_DEPTH)


solid = part.part
